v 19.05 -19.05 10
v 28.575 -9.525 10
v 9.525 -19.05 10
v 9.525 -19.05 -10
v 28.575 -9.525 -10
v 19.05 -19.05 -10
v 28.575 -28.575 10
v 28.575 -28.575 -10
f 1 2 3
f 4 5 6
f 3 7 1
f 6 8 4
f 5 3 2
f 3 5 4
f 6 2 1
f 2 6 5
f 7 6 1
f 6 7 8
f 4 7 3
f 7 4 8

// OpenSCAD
polyhedron(
    points=[
    [9.525, -19.05, 10],
    [28.575, -9.525, 10],
    [19.05, -19.05, 10],
    [28.575, -28.575, 10],
    [9.525, -19.05, -10],
    [28.575, -9.525, -10],
    [19.05, -19.05, -10],
    [28.575, -28.575, -10],
    ],
    faces=[
        [0,1,2],
        [6,5,4],
        [2,3,0],
        [4,7,6],
        [0,4,5,1],
        [1,5,6,2],
        [2,6,7,3],
        [3,7,4,0],
    ]
);
